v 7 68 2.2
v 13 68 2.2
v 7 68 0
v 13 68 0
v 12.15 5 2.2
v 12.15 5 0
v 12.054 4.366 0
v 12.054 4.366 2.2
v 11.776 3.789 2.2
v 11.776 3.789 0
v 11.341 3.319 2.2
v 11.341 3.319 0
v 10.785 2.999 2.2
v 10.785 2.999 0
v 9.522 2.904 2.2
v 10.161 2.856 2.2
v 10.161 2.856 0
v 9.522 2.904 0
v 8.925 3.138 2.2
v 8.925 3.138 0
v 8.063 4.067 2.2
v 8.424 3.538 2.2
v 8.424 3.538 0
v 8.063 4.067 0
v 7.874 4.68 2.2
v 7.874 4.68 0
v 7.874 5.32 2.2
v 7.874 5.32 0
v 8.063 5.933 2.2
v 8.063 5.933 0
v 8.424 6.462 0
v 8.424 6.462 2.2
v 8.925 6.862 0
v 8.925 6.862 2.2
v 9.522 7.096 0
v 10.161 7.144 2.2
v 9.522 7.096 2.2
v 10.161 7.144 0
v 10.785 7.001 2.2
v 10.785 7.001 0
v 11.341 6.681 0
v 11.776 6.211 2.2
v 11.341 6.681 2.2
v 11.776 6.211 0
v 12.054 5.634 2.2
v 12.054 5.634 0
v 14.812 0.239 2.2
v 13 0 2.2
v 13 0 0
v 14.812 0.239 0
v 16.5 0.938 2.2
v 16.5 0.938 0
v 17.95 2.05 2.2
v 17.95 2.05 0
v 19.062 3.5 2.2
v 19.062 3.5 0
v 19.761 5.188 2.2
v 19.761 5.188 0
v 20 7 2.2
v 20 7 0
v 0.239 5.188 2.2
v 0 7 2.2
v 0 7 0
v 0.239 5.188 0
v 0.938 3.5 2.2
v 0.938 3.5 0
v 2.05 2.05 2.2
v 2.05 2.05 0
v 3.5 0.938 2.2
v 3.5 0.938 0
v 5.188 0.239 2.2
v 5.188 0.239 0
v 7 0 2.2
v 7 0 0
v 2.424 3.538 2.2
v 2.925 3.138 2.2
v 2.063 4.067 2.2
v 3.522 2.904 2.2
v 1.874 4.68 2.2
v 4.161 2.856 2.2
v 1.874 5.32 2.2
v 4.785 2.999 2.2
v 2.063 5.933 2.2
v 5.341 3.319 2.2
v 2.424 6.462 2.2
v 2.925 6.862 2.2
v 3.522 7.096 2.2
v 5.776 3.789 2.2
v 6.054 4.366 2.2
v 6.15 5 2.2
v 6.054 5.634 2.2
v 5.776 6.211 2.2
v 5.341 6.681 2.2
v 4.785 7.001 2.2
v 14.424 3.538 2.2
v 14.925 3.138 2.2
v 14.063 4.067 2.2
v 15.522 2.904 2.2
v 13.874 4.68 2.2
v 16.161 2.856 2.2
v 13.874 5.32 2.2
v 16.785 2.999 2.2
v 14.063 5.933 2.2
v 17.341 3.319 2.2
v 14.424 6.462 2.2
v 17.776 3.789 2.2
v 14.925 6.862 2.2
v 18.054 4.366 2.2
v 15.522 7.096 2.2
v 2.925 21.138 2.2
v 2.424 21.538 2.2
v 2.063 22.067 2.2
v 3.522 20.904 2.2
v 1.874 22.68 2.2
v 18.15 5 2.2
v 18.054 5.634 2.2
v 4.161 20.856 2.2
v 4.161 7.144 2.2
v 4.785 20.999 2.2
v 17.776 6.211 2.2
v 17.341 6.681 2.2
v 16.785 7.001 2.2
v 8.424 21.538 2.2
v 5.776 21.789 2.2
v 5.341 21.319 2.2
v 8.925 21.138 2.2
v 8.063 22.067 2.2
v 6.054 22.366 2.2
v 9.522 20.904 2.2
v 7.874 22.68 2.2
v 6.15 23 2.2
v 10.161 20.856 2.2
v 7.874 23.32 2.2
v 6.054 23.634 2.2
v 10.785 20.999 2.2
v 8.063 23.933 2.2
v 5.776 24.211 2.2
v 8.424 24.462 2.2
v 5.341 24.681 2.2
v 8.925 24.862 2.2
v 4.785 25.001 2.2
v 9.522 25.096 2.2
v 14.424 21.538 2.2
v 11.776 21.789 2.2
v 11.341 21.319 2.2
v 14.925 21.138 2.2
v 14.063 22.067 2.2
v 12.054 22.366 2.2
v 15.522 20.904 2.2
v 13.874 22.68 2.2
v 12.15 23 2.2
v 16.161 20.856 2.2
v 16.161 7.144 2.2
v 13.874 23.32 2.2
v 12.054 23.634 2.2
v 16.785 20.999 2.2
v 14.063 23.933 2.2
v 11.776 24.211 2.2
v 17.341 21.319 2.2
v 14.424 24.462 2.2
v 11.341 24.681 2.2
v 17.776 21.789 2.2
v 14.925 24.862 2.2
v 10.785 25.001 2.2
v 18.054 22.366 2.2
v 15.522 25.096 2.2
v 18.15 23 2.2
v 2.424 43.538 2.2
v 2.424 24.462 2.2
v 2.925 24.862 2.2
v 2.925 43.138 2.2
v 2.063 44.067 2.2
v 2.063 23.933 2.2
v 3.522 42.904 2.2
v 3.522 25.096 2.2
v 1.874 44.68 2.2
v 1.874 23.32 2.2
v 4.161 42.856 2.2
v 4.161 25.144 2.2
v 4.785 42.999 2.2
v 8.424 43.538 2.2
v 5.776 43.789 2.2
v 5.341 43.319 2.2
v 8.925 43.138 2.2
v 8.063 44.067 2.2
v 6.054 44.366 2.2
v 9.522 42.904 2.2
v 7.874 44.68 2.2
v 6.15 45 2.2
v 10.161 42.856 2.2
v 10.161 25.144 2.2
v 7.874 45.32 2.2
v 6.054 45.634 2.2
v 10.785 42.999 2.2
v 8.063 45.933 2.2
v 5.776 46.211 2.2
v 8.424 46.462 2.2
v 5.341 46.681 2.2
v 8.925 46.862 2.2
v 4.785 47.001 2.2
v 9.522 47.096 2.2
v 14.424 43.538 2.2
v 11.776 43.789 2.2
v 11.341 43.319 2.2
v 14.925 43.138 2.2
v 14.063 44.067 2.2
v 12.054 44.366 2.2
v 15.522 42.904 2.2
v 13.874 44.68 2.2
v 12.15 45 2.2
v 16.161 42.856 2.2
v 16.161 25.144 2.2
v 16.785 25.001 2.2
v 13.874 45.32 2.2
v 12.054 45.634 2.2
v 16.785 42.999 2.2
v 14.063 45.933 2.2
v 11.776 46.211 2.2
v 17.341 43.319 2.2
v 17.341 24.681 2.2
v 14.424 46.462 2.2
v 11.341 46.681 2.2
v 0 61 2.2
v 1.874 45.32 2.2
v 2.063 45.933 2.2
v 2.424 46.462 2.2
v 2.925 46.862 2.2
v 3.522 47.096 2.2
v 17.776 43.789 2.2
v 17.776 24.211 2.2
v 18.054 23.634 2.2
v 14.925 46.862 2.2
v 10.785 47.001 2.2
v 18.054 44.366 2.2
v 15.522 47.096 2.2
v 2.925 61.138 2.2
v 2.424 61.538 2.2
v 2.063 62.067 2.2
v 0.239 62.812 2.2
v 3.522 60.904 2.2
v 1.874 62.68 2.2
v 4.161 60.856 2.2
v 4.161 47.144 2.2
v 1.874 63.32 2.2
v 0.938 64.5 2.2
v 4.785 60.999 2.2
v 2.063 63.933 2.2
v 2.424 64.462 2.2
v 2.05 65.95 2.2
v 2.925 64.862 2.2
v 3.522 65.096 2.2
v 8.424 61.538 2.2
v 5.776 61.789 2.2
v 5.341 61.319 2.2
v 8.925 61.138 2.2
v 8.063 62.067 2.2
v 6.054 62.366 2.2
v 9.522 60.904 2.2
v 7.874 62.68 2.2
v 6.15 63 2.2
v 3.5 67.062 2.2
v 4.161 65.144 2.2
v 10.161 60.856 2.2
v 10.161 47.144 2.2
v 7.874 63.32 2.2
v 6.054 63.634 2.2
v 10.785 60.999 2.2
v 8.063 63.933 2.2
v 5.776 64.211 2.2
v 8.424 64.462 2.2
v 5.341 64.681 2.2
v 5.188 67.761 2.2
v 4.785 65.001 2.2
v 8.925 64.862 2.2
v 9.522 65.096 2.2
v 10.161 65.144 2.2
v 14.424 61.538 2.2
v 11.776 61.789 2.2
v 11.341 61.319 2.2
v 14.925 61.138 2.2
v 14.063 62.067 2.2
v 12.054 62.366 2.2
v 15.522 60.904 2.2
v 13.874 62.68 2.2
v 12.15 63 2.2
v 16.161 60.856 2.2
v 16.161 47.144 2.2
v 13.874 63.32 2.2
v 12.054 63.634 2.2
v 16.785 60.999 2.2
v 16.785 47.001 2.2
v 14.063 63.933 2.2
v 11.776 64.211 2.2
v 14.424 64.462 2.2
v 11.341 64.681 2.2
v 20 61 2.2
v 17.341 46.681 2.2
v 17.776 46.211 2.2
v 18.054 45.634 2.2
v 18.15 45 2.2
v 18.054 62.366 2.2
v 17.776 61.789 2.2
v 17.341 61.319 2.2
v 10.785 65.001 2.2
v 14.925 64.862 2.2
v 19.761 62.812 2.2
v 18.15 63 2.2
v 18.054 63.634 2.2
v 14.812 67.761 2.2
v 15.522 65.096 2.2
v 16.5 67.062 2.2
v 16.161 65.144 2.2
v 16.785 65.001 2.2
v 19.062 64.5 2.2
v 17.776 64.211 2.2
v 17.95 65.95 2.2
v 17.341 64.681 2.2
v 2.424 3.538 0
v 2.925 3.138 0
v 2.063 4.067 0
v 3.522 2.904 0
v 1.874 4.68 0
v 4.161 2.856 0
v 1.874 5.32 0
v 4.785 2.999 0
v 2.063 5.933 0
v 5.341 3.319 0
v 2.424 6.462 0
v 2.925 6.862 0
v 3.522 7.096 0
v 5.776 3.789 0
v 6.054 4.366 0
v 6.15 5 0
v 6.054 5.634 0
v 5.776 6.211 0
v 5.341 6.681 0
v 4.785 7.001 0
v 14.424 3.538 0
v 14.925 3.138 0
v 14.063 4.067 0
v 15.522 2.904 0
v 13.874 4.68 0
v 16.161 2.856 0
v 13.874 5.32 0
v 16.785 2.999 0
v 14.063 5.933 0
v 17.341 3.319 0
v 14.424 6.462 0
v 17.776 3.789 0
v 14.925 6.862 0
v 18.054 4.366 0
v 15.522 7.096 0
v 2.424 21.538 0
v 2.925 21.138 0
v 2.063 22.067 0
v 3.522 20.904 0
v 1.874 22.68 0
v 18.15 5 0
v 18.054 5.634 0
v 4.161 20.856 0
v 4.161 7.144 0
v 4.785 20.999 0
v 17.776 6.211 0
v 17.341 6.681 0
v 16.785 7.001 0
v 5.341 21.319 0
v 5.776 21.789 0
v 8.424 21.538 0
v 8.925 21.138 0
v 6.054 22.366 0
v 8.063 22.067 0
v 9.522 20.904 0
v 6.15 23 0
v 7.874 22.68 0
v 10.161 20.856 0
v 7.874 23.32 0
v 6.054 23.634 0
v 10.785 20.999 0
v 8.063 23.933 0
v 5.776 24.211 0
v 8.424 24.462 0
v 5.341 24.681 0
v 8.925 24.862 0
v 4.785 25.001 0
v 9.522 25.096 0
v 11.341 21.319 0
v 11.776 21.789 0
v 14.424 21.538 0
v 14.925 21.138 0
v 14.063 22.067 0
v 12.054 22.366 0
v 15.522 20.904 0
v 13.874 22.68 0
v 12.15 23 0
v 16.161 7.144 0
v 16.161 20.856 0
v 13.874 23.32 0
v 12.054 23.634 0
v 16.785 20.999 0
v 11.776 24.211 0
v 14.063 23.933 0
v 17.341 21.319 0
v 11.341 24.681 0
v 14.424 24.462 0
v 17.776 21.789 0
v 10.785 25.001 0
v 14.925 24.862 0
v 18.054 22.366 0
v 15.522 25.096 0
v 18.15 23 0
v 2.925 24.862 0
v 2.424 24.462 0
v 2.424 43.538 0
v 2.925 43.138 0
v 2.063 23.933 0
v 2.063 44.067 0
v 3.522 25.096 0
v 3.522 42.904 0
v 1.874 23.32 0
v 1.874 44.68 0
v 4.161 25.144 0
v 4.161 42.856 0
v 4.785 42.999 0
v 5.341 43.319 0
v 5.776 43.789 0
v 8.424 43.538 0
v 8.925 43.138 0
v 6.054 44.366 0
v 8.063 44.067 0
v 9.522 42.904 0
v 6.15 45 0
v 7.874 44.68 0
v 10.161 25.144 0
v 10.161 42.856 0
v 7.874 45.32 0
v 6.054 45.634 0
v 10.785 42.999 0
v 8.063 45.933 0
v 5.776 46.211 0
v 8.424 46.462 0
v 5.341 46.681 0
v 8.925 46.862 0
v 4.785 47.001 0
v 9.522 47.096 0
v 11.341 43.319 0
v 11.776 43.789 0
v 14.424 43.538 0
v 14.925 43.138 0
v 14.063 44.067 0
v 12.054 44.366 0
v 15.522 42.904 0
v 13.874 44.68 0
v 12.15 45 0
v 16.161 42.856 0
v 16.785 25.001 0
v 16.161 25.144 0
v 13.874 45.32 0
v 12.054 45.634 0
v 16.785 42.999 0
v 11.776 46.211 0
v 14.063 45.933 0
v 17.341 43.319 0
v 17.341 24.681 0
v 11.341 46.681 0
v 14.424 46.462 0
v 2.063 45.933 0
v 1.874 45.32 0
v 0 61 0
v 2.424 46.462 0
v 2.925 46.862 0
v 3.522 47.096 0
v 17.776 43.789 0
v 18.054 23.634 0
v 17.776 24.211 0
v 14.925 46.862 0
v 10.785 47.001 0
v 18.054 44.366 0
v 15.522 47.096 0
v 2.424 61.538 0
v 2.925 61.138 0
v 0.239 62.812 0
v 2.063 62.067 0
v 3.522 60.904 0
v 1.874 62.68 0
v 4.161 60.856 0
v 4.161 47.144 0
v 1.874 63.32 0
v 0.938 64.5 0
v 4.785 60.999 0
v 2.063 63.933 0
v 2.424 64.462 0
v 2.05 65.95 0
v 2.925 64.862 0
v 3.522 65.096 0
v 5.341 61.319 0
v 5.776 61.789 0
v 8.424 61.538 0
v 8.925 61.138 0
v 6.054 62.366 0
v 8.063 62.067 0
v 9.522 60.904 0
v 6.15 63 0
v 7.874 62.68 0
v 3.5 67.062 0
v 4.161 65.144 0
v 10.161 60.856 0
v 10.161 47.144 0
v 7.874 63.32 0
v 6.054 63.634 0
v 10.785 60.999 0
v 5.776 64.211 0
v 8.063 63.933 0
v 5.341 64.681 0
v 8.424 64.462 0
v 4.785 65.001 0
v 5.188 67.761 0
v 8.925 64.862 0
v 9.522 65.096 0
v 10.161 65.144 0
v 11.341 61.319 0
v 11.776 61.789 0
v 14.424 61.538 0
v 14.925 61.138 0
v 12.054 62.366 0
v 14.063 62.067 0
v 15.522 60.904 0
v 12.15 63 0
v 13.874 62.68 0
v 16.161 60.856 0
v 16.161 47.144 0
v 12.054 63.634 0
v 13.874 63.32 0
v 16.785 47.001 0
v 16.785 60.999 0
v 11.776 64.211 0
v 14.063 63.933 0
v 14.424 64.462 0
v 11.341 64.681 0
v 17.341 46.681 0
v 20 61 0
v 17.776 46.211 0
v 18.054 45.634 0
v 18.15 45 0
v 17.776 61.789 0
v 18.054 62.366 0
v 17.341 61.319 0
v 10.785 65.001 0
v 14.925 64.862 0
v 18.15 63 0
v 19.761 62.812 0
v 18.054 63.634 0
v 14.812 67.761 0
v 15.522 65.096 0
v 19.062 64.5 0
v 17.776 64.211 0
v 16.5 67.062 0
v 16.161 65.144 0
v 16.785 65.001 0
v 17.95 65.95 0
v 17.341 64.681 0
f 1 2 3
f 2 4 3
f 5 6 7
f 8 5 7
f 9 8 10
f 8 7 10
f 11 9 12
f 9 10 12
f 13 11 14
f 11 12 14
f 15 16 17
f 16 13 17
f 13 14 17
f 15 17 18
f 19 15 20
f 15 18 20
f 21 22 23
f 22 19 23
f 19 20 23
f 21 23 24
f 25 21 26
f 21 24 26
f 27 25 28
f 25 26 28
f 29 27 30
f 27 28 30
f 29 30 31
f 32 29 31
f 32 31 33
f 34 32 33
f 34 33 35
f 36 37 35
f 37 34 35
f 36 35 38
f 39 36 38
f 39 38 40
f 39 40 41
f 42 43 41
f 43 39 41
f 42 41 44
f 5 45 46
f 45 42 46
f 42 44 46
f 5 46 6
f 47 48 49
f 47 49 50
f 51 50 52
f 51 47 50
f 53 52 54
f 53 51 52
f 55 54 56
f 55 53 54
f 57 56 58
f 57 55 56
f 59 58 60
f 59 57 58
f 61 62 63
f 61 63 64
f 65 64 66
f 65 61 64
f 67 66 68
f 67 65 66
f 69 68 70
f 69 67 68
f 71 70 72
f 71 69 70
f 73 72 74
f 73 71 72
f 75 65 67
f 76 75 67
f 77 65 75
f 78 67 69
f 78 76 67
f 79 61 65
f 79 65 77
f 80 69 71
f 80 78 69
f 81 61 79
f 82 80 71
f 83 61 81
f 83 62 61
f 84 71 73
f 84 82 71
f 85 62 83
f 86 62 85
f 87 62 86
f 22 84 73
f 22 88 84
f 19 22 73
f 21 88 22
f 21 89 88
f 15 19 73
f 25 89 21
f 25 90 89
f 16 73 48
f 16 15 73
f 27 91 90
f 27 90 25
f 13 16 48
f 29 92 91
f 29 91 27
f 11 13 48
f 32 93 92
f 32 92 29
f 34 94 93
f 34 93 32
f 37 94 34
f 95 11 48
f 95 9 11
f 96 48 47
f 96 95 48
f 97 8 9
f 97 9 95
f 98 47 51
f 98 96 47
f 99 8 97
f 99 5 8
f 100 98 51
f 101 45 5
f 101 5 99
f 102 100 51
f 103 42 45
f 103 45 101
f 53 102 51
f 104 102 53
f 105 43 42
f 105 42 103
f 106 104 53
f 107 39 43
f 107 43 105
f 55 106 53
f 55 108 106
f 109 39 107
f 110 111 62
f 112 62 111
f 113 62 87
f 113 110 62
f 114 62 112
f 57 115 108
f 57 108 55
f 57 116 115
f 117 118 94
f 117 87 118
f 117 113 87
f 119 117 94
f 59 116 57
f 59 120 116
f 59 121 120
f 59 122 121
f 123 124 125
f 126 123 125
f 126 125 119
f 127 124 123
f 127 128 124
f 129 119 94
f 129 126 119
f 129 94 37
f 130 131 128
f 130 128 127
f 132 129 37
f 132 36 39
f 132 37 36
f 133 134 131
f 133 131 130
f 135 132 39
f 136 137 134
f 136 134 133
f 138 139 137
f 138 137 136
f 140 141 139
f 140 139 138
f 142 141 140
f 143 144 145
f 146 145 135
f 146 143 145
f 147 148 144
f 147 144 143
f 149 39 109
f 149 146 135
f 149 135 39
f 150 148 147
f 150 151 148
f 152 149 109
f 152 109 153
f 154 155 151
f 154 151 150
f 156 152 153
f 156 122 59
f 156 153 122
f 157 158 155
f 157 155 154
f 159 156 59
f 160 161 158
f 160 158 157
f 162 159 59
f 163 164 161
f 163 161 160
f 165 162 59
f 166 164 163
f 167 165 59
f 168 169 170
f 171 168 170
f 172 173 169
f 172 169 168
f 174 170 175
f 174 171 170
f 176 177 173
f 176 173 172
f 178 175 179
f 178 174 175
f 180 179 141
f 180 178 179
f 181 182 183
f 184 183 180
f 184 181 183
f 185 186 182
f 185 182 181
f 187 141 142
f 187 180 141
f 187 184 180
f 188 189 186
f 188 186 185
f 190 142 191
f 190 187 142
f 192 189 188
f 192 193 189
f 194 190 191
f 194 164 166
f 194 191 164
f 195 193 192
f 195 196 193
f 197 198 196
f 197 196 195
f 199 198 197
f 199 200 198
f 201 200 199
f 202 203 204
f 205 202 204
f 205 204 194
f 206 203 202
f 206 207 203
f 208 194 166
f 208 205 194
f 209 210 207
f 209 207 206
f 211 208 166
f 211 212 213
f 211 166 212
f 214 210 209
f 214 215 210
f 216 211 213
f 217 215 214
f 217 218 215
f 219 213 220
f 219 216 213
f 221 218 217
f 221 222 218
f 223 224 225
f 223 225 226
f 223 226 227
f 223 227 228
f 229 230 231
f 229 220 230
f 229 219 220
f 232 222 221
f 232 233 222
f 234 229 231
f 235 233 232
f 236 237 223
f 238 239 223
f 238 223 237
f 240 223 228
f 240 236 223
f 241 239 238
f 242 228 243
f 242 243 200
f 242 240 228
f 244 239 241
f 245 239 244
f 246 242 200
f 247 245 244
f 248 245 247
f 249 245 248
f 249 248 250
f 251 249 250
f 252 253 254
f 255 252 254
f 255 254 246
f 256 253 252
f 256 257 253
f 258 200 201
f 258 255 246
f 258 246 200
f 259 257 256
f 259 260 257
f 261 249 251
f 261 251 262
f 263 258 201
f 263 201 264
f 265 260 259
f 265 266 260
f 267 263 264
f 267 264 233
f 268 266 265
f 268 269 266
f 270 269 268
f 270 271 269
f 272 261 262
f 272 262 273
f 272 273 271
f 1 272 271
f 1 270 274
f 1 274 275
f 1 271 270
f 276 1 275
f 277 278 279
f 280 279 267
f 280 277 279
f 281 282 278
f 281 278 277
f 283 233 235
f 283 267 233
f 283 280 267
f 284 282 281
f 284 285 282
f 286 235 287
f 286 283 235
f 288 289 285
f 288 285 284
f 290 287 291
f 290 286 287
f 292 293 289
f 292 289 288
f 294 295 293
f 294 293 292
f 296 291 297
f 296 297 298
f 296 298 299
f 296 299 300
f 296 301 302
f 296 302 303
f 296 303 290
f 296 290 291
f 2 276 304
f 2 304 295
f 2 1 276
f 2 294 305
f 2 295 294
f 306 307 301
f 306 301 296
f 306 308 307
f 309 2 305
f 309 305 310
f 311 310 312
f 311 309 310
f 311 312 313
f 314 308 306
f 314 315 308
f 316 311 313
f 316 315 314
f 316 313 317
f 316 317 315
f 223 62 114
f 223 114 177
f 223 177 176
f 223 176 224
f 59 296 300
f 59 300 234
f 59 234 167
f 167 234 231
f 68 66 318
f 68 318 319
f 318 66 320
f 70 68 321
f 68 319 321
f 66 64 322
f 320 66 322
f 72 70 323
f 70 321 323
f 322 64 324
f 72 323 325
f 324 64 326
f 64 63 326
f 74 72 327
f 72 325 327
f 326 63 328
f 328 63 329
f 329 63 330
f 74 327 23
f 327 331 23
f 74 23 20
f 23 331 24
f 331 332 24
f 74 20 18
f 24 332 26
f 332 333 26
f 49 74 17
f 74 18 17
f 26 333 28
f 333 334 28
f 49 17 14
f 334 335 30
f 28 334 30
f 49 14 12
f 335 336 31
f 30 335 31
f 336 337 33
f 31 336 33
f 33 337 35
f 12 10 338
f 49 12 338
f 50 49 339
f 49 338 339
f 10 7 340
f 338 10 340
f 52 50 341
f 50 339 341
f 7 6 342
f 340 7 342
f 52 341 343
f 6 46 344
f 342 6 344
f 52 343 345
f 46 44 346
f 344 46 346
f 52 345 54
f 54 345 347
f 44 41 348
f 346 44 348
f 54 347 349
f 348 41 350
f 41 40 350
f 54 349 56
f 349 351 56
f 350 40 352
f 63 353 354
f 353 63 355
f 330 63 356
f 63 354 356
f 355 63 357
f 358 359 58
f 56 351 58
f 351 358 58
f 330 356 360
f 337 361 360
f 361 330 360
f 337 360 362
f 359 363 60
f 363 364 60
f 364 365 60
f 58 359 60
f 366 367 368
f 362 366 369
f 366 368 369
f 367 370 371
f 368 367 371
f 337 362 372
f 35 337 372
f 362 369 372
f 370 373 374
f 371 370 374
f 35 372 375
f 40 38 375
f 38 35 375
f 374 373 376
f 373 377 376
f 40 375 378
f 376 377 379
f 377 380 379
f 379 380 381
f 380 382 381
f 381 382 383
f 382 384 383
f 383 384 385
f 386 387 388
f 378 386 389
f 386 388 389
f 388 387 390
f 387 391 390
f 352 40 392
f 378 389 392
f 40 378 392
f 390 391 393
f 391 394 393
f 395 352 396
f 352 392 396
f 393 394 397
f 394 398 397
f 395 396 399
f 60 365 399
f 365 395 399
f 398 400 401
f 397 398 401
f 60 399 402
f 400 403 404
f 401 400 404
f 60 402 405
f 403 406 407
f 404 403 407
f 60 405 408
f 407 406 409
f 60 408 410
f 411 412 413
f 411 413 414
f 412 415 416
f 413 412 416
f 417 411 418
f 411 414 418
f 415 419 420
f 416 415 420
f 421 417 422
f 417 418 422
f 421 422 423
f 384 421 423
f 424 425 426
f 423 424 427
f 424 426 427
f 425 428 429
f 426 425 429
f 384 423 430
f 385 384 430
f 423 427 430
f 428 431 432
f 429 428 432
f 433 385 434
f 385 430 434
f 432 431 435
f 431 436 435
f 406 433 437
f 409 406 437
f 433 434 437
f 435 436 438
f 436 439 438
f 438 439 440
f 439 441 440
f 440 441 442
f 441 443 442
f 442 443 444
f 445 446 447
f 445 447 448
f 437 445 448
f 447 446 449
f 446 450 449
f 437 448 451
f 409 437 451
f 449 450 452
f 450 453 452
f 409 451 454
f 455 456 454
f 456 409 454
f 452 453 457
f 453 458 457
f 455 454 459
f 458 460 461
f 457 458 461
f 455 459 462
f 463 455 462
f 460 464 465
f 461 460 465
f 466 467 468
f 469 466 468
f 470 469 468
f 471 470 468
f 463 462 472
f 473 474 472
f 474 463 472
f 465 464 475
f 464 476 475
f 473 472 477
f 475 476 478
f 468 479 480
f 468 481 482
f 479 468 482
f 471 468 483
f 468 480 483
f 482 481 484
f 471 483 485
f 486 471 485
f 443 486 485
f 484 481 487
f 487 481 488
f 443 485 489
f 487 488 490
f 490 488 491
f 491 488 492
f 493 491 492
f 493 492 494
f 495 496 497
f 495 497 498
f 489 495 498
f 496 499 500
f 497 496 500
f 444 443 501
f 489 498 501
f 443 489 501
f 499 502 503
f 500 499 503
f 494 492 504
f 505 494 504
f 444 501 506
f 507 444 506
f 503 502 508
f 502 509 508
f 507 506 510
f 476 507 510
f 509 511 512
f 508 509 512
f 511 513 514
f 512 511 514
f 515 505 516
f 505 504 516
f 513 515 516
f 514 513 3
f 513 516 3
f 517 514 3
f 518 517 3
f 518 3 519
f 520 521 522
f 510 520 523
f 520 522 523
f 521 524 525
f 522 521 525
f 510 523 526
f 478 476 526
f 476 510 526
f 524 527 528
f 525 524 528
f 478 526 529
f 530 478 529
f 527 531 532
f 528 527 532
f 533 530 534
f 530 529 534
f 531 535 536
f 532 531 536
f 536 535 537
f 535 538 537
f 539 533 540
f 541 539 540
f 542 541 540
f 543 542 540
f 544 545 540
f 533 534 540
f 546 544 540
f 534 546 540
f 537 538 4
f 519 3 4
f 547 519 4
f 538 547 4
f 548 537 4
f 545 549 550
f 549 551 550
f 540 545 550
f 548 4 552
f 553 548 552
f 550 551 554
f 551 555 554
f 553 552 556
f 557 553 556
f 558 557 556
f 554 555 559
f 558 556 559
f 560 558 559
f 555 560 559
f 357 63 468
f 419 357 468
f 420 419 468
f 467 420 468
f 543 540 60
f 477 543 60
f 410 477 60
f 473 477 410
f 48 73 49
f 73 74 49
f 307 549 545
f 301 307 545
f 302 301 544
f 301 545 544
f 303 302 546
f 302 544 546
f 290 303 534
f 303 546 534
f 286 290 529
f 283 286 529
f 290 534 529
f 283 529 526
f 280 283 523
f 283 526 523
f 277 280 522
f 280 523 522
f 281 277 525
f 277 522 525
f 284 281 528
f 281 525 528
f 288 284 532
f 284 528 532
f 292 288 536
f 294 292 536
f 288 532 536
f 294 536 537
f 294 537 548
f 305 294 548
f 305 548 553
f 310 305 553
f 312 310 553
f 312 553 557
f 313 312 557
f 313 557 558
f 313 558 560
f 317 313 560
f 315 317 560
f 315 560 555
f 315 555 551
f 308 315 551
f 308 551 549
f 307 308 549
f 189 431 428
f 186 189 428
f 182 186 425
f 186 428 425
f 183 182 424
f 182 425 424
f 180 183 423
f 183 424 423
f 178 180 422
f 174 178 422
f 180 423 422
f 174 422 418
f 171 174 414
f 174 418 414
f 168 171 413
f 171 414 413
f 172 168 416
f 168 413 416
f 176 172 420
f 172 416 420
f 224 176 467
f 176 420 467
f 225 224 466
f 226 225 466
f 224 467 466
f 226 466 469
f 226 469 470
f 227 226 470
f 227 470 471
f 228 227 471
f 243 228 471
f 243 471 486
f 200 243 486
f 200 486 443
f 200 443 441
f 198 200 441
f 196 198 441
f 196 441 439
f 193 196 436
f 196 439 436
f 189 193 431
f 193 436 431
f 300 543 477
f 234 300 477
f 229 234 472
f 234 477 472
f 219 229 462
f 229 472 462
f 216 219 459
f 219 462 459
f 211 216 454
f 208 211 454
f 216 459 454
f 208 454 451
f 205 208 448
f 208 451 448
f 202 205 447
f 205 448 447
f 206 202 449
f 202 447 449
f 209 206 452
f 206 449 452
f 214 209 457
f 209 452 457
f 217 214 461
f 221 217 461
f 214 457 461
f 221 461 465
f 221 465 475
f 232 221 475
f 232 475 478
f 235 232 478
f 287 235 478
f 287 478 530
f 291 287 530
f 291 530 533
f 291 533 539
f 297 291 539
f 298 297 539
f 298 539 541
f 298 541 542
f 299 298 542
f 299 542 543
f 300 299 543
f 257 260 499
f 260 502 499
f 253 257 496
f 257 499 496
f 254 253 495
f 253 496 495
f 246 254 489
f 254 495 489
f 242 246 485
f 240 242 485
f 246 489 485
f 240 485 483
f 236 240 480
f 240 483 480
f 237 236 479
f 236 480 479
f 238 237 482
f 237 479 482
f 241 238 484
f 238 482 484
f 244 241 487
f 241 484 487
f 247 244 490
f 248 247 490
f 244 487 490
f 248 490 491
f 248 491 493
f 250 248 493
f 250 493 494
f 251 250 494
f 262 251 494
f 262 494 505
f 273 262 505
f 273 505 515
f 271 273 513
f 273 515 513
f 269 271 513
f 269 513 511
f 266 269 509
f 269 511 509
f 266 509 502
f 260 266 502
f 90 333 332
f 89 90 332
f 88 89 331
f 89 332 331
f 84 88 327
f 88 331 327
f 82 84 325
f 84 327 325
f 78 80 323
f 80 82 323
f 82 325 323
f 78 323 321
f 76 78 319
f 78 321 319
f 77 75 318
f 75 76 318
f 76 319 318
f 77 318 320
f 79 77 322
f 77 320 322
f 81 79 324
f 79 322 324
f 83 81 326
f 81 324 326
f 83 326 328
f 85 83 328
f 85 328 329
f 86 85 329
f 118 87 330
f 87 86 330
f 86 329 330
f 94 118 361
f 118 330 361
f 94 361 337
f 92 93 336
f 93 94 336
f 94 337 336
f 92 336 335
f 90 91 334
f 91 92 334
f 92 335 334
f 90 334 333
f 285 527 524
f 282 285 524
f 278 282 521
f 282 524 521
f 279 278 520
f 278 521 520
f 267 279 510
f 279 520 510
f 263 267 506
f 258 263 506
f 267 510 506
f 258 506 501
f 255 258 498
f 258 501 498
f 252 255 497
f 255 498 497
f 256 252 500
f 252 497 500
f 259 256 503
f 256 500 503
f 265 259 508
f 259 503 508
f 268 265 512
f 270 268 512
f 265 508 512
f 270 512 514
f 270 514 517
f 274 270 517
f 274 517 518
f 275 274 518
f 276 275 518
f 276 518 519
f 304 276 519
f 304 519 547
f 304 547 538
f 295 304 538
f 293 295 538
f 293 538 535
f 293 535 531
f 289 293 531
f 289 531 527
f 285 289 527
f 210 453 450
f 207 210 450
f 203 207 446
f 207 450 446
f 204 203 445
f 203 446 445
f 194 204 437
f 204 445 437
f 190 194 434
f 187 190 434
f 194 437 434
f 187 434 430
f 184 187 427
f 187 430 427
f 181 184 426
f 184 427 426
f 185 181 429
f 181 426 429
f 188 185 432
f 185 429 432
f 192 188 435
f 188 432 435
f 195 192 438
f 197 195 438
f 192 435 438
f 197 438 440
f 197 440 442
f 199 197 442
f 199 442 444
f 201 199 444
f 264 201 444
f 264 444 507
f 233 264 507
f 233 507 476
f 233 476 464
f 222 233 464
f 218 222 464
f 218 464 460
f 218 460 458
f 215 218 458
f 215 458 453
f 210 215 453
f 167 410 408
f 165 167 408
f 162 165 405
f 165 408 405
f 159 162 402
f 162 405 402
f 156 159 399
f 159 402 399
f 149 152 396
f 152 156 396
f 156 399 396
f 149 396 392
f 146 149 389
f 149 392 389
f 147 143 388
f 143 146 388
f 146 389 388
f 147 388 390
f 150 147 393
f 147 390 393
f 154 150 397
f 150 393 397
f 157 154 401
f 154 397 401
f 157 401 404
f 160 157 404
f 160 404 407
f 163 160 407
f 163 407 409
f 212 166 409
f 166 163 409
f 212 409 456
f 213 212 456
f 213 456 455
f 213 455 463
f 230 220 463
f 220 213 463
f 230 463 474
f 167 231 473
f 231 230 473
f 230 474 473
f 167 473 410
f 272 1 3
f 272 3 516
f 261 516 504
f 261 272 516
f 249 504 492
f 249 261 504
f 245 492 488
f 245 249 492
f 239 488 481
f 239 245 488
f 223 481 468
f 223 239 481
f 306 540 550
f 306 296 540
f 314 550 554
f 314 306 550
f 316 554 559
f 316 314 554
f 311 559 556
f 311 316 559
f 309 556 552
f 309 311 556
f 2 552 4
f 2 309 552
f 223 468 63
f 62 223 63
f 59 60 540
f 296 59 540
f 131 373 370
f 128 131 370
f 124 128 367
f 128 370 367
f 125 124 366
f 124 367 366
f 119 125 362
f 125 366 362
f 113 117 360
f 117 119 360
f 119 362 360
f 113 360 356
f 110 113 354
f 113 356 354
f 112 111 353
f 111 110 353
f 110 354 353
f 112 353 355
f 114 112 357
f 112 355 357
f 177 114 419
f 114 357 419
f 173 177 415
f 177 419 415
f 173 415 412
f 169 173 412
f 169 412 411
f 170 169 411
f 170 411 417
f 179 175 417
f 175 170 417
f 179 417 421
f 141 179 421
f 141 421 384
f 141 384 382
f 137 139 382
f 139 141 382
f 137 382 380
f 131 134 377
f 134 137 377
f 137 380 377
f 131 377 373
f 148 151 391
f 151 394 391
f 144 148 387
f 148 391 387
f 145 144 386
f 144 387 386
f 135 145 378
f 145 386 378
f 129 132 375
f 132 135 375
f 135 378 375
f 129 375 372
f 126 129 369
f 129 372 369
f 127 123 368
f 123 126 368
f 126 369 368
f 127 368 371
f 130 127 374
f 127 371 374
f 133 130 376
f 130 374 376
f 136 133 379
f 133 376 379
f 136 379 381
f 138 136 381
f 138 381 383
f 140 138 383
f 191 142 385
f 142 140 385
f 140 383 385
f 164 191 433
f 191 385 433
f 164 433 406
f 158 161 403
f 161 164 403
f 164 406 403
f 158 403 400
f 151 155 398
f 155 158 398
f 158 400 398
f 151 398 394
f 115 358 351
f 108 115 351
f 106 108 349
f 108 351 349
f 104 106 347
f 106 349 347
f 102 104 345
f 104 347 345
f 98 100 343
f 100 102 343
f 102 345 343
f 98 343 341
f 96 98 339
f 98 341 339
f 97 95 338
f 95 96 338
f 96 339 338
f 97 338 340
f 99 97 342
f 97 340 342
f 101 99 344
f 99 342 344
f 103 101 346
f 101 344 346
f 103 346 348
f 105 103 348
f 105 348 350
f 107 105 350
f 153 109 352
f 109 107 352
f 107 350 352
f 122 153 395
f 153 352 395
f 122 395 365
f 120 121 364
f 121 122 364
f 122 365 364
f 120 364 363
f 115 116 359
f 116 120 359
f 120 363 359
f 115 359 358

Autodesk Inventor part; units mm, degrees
ref_plane "YZ Plane" through (0, 0, 0) normal (1, 0, 0) x (0, 1, 0)
ref_plane "XZ Plane" through (0, 0, 0) normal (0, 1, 0) x (-1, 0, 0)
ref_plane "XY Plane" through (0, 0, 0) normal (0, 0, 1) x (1, 0, 0)
sketch "Esquisse12" plane through (0, 0, 0) normal (0, 0, 1) x (1, 0, 0)
  line L0 (0, 0) -> (20, 0)
  line L1 (20, 0) -> (20, 34)
  line L2 (20, 34) -> (0, 34)
  line L3 (0, 34) -> (0, 0)
  line L4 (10, 34) -> (10, 0) construction
  circle A0 centre (10, 5) radius 2.15
  line L5 (10, 5) -> (20, 5) construction
  circle A1 centre (16, 5) radius 2.15
  circle A2 centre (4, 5) radius 2.15
  circle A3 centre (10, 5) radius 2.15
  circle A4 centre (10, 23) radius 2.15
  circle A5 centre (16, 23) radius 2.15
  circle A6 centre (4, 23) radius 2.15
  dimension "d133" = 20
  dimension "d134" = 5
  dimension "d135" = 4.3
  dimension "d138" = 6
  dimension "d141" = 6
  dimension "d148" = 18
  dimension "d153" = 11
extrude "Extrusion13" add sketch "Esquisse12" along normal blind 2.2
fillet "Congé8" radius 7 2 edges at (20, 0, 1.1) (0, 0, 1.1)
mirror "Symétrie3" about plane through (20, 34, 0) normal (0, 1, 0)
equation "\"d135\" = Holes"
equation "\"d154\" = Depth"
equation "\"d156\" = Rounding"
equation "\"Depth\" = 2.2"
equation "\"Holes\" = 4.3"
equation "\"Height\" = 0"
equation "\"Rounding\" = 7"
properties part number "SideToSide"
